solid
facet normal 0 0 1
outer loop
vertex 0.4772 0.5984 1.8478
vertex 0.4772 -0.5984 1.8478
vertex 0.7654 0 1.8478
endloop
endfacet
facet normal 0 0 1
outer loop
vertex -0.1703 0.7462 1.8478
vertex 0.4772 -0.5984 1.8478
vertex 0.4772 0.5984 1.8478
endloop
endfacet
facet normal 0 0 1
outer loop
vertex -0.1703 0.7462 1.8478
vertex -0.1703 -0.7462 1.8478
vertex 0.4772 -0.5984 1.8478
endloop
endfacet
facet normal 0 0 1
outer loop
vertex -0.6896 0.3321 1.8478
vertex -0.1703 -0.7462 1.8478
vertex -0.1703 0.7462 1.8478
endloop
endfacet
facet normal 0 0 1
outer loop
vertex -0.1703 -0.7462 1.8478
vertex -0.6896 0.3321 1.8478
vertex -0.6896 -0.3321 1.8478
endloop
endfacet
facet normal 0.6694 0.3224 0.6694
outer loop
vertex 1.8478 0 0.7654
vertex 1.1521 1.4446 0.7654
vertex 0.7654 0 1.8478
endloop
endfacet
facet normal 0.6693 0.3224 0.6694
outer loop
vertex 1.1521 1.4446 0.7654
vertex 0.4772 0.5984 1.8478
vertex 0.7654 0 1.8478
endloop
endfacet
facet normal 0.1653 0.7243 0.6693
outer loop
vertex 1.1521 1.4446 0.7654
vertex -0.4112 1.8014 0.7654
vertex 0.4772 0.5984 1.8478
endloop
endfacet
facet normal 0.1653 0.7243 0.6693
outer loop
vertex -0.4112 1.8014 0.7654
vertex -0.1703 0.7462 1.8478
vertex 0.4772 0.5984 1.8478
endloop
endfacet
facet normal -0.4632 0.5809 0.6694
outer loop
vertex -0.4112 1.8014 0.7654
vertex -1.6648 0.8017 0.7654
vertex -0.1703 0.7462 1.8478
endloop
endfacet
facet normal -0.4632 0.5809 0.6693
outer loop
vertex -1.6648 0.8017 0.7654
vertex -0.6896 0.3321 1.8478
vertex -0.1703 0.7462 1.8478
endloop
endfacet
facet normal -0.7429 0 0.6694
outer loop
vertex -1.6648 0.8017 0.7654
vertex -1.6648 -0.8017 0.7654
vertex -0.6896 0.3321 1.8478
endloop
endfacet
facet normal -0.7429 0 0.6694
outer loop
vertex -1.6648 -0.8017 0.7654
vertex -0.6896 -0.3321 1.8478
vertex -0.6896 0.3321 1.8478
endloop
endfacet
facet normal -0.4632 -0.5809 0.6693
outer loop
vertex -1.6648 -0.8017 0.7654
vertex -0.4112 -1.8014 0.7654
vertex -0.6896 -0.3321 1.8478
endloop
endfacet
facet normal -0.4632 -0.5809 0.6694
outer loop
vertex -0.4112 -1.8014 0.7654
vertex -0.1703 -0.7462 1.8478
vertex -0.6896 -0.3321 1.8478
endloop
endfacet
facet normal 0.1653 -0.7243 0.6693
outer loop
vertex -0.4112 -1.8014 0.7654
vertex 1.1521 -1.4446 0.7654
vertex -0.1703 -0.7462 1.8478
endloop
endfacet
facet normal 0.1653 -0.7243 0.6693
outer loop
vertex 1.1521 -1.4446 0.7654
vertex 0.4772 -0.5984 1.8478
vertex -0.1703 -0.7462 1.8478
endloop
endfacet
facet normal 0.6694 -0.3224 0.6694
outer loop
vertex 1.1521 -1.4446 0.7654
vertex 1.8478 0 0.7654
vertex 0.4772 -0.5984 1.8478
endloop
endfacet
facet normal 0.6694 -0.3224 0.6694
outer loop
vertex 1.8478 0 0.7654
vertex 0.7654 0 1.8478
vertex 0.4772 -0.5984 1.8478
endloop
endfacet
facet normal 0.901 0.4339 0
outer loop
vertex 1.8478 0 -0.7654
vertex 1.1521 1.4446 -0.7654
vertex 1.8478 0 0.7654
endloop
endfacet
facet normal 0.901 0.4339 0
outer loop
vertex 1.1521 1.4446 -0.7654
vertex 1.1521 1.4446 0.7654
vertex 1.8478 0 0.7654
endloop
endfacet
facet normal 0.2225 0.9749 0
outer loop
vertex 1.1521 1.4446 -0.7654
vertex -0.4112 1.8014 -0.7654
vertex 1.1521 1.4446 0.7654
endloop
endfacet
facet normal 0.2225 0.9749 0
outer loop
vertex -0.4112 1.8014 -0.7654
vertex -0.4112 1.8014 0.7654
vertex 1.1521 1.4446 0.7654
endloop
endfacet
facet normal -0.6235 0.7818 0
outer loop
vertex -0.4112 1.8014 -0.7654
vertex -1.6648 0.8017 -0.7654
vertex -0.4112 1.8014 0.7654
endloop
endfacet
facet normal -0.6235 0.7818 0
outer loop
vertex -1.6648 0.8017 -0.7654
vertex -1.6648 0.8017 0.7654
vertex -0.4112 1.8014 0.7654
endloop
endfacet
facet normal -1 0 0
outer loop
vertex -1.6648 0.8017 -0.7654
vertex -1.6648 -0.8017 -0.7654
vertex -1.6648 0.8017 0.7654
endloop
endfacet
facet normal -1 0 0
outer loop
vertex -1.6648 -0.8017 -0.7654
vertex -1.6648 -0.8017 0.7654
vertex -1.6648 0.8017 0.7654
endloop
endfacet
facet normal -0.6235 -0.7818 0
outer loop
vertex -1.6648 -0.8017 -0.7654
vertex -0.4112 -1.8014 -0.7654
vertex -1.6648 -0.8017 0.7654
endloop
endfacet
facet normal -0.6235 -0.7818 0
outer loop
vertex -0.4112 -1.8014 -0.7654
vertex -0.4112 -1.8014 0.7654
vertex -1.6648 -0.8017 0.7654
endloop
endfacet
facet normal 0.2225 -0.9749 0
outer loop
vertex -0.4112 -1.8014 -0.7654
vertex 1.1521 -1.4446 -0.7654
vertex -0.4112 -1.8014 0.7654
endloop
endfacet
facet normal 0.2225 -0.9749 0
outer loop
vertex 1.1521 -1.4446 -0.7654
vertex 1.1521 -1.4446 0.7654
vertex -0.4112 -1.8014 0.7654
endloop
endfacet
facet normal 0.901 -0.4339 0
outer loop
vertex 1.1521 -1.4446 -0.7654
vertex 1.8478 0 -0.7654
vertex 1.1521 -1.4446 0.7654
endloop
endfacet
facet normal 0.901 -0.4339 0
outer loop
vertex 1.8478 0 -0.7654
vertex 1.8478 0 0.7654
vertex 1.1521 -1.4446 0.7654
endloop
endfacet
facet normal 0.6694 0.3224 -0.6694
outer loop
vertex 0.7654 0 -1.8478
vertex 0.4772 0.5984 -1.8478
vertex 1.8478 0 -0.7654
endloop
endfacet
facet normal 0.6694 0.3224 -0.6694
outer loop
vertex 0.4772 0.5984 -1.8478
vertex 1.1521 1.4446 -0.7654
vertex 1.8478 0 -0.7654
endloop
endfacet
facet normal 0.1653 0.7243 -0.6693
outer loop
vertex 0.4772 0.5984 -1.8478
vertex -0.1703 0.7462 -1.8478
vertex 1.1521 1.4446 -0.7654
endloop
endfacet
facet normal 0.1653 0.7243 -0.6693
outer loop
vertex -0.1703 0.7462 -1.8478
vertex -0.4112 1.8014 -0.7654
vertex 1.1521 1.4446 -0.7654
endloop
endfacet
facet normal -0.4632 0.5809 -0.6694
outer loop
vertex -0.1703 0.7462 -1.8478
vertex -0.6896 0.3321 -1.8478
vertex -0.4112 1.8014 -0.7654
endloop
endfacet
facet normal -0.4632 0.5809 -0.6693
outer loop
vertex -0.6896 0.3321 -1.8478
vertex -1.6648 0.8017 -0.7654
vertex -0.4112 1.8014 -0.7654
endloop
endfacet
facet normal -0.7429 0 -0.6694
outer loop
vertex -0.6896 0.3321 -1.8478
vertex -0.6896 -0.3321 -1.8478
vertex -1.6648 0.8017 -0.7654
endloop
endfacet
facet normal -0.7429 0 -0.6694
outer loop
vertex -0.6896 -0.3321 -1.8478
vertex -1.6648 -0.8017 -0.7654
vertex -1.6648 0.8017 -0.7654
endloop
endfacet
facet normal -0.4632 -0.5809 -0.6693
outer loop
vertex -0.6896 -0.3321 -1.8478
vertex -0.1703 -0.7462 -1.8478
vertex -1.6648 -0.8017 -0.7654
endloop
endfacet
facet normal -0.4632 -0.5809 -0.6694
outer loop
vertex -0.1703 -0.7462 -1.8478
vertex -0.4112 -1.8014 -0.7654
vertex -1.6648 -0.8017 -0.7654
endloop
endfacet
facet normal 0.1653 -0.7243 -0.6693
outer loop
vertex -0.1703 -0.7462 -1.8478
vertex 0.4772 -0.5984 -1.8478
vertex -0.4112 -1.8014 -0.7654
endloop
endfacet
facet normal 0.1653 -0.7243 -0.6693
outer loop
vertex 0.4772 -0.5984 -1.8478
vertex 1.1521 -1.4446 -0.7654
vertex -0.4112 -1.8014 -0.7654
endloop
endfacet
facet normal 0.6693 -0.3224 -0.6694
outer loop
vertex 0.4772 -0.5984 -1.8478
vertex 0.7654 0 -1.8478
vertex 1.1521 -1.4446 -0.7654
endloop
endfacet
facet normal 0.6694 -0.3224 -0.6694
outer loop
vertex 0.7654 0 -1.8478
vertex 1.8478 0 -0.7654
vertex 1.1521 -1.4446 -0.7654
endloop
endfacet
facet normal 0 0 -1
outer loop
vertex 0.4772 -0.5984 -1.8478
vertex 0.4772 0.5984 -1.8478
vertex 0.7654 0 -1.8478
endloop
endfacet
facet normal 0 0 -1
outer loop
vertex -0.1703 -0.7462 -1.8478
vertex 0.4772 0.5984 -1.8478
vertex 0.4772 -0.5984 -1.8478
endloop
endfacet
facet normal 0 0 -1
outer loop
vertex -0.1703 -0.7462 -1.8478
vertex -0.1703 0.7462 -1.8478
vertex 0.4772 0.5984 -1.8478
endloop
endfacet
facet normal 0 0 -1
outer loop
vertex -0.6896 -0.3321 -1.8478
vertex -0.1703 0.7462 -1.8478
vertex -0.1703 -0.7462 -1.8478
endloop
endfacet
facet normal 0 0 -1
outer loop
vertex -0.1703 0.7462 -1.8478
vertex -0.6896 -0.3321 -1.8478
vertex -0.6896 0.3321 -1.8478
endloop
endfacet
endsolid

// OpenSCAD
/*
<json>
    {
        "Name": "Item 1",
        "Desc": "Use the slider to indicate how many columns printed acceptably.",
        "LowKeyword": "Lost",
        "HighKeyword": "Printed",
        "varBase": "PosPillarDiaV",
        "minDefault": 0.1,
        "maxDefault": 2,
        "minDefaultND": "0.5 * nozzleDiameter",
        "maxDefaultND": "5 * nozzleDiameter",
        "cameraData": "-2.28,2.59,6.06,59.9,0,13.8,113.4",
        "sortOrder": 0
    }
</json>
*/

sphere(d=4);

/*
<json>
    {
        "Name": "Item 2",
        "Desc": "Use the slider to indicate how many columns printed acceptably.",
        "LowKeyword": "Lost",
        "HighKeyword": "Printed"
        "varBase": "PosPillarDiaV",
        "minDefault": 0.1,
        "maxDefault": 2,
        "minDefaultND": "0.5 * nozzleDiameter",
        "maxDefaultND": "5 * nozzleDiameter",
        "cameraData": "-2.28,2.59,6.06,59.9,0,13.8,113.4",
        "sortOrder": 0
    }
</json>
*/
